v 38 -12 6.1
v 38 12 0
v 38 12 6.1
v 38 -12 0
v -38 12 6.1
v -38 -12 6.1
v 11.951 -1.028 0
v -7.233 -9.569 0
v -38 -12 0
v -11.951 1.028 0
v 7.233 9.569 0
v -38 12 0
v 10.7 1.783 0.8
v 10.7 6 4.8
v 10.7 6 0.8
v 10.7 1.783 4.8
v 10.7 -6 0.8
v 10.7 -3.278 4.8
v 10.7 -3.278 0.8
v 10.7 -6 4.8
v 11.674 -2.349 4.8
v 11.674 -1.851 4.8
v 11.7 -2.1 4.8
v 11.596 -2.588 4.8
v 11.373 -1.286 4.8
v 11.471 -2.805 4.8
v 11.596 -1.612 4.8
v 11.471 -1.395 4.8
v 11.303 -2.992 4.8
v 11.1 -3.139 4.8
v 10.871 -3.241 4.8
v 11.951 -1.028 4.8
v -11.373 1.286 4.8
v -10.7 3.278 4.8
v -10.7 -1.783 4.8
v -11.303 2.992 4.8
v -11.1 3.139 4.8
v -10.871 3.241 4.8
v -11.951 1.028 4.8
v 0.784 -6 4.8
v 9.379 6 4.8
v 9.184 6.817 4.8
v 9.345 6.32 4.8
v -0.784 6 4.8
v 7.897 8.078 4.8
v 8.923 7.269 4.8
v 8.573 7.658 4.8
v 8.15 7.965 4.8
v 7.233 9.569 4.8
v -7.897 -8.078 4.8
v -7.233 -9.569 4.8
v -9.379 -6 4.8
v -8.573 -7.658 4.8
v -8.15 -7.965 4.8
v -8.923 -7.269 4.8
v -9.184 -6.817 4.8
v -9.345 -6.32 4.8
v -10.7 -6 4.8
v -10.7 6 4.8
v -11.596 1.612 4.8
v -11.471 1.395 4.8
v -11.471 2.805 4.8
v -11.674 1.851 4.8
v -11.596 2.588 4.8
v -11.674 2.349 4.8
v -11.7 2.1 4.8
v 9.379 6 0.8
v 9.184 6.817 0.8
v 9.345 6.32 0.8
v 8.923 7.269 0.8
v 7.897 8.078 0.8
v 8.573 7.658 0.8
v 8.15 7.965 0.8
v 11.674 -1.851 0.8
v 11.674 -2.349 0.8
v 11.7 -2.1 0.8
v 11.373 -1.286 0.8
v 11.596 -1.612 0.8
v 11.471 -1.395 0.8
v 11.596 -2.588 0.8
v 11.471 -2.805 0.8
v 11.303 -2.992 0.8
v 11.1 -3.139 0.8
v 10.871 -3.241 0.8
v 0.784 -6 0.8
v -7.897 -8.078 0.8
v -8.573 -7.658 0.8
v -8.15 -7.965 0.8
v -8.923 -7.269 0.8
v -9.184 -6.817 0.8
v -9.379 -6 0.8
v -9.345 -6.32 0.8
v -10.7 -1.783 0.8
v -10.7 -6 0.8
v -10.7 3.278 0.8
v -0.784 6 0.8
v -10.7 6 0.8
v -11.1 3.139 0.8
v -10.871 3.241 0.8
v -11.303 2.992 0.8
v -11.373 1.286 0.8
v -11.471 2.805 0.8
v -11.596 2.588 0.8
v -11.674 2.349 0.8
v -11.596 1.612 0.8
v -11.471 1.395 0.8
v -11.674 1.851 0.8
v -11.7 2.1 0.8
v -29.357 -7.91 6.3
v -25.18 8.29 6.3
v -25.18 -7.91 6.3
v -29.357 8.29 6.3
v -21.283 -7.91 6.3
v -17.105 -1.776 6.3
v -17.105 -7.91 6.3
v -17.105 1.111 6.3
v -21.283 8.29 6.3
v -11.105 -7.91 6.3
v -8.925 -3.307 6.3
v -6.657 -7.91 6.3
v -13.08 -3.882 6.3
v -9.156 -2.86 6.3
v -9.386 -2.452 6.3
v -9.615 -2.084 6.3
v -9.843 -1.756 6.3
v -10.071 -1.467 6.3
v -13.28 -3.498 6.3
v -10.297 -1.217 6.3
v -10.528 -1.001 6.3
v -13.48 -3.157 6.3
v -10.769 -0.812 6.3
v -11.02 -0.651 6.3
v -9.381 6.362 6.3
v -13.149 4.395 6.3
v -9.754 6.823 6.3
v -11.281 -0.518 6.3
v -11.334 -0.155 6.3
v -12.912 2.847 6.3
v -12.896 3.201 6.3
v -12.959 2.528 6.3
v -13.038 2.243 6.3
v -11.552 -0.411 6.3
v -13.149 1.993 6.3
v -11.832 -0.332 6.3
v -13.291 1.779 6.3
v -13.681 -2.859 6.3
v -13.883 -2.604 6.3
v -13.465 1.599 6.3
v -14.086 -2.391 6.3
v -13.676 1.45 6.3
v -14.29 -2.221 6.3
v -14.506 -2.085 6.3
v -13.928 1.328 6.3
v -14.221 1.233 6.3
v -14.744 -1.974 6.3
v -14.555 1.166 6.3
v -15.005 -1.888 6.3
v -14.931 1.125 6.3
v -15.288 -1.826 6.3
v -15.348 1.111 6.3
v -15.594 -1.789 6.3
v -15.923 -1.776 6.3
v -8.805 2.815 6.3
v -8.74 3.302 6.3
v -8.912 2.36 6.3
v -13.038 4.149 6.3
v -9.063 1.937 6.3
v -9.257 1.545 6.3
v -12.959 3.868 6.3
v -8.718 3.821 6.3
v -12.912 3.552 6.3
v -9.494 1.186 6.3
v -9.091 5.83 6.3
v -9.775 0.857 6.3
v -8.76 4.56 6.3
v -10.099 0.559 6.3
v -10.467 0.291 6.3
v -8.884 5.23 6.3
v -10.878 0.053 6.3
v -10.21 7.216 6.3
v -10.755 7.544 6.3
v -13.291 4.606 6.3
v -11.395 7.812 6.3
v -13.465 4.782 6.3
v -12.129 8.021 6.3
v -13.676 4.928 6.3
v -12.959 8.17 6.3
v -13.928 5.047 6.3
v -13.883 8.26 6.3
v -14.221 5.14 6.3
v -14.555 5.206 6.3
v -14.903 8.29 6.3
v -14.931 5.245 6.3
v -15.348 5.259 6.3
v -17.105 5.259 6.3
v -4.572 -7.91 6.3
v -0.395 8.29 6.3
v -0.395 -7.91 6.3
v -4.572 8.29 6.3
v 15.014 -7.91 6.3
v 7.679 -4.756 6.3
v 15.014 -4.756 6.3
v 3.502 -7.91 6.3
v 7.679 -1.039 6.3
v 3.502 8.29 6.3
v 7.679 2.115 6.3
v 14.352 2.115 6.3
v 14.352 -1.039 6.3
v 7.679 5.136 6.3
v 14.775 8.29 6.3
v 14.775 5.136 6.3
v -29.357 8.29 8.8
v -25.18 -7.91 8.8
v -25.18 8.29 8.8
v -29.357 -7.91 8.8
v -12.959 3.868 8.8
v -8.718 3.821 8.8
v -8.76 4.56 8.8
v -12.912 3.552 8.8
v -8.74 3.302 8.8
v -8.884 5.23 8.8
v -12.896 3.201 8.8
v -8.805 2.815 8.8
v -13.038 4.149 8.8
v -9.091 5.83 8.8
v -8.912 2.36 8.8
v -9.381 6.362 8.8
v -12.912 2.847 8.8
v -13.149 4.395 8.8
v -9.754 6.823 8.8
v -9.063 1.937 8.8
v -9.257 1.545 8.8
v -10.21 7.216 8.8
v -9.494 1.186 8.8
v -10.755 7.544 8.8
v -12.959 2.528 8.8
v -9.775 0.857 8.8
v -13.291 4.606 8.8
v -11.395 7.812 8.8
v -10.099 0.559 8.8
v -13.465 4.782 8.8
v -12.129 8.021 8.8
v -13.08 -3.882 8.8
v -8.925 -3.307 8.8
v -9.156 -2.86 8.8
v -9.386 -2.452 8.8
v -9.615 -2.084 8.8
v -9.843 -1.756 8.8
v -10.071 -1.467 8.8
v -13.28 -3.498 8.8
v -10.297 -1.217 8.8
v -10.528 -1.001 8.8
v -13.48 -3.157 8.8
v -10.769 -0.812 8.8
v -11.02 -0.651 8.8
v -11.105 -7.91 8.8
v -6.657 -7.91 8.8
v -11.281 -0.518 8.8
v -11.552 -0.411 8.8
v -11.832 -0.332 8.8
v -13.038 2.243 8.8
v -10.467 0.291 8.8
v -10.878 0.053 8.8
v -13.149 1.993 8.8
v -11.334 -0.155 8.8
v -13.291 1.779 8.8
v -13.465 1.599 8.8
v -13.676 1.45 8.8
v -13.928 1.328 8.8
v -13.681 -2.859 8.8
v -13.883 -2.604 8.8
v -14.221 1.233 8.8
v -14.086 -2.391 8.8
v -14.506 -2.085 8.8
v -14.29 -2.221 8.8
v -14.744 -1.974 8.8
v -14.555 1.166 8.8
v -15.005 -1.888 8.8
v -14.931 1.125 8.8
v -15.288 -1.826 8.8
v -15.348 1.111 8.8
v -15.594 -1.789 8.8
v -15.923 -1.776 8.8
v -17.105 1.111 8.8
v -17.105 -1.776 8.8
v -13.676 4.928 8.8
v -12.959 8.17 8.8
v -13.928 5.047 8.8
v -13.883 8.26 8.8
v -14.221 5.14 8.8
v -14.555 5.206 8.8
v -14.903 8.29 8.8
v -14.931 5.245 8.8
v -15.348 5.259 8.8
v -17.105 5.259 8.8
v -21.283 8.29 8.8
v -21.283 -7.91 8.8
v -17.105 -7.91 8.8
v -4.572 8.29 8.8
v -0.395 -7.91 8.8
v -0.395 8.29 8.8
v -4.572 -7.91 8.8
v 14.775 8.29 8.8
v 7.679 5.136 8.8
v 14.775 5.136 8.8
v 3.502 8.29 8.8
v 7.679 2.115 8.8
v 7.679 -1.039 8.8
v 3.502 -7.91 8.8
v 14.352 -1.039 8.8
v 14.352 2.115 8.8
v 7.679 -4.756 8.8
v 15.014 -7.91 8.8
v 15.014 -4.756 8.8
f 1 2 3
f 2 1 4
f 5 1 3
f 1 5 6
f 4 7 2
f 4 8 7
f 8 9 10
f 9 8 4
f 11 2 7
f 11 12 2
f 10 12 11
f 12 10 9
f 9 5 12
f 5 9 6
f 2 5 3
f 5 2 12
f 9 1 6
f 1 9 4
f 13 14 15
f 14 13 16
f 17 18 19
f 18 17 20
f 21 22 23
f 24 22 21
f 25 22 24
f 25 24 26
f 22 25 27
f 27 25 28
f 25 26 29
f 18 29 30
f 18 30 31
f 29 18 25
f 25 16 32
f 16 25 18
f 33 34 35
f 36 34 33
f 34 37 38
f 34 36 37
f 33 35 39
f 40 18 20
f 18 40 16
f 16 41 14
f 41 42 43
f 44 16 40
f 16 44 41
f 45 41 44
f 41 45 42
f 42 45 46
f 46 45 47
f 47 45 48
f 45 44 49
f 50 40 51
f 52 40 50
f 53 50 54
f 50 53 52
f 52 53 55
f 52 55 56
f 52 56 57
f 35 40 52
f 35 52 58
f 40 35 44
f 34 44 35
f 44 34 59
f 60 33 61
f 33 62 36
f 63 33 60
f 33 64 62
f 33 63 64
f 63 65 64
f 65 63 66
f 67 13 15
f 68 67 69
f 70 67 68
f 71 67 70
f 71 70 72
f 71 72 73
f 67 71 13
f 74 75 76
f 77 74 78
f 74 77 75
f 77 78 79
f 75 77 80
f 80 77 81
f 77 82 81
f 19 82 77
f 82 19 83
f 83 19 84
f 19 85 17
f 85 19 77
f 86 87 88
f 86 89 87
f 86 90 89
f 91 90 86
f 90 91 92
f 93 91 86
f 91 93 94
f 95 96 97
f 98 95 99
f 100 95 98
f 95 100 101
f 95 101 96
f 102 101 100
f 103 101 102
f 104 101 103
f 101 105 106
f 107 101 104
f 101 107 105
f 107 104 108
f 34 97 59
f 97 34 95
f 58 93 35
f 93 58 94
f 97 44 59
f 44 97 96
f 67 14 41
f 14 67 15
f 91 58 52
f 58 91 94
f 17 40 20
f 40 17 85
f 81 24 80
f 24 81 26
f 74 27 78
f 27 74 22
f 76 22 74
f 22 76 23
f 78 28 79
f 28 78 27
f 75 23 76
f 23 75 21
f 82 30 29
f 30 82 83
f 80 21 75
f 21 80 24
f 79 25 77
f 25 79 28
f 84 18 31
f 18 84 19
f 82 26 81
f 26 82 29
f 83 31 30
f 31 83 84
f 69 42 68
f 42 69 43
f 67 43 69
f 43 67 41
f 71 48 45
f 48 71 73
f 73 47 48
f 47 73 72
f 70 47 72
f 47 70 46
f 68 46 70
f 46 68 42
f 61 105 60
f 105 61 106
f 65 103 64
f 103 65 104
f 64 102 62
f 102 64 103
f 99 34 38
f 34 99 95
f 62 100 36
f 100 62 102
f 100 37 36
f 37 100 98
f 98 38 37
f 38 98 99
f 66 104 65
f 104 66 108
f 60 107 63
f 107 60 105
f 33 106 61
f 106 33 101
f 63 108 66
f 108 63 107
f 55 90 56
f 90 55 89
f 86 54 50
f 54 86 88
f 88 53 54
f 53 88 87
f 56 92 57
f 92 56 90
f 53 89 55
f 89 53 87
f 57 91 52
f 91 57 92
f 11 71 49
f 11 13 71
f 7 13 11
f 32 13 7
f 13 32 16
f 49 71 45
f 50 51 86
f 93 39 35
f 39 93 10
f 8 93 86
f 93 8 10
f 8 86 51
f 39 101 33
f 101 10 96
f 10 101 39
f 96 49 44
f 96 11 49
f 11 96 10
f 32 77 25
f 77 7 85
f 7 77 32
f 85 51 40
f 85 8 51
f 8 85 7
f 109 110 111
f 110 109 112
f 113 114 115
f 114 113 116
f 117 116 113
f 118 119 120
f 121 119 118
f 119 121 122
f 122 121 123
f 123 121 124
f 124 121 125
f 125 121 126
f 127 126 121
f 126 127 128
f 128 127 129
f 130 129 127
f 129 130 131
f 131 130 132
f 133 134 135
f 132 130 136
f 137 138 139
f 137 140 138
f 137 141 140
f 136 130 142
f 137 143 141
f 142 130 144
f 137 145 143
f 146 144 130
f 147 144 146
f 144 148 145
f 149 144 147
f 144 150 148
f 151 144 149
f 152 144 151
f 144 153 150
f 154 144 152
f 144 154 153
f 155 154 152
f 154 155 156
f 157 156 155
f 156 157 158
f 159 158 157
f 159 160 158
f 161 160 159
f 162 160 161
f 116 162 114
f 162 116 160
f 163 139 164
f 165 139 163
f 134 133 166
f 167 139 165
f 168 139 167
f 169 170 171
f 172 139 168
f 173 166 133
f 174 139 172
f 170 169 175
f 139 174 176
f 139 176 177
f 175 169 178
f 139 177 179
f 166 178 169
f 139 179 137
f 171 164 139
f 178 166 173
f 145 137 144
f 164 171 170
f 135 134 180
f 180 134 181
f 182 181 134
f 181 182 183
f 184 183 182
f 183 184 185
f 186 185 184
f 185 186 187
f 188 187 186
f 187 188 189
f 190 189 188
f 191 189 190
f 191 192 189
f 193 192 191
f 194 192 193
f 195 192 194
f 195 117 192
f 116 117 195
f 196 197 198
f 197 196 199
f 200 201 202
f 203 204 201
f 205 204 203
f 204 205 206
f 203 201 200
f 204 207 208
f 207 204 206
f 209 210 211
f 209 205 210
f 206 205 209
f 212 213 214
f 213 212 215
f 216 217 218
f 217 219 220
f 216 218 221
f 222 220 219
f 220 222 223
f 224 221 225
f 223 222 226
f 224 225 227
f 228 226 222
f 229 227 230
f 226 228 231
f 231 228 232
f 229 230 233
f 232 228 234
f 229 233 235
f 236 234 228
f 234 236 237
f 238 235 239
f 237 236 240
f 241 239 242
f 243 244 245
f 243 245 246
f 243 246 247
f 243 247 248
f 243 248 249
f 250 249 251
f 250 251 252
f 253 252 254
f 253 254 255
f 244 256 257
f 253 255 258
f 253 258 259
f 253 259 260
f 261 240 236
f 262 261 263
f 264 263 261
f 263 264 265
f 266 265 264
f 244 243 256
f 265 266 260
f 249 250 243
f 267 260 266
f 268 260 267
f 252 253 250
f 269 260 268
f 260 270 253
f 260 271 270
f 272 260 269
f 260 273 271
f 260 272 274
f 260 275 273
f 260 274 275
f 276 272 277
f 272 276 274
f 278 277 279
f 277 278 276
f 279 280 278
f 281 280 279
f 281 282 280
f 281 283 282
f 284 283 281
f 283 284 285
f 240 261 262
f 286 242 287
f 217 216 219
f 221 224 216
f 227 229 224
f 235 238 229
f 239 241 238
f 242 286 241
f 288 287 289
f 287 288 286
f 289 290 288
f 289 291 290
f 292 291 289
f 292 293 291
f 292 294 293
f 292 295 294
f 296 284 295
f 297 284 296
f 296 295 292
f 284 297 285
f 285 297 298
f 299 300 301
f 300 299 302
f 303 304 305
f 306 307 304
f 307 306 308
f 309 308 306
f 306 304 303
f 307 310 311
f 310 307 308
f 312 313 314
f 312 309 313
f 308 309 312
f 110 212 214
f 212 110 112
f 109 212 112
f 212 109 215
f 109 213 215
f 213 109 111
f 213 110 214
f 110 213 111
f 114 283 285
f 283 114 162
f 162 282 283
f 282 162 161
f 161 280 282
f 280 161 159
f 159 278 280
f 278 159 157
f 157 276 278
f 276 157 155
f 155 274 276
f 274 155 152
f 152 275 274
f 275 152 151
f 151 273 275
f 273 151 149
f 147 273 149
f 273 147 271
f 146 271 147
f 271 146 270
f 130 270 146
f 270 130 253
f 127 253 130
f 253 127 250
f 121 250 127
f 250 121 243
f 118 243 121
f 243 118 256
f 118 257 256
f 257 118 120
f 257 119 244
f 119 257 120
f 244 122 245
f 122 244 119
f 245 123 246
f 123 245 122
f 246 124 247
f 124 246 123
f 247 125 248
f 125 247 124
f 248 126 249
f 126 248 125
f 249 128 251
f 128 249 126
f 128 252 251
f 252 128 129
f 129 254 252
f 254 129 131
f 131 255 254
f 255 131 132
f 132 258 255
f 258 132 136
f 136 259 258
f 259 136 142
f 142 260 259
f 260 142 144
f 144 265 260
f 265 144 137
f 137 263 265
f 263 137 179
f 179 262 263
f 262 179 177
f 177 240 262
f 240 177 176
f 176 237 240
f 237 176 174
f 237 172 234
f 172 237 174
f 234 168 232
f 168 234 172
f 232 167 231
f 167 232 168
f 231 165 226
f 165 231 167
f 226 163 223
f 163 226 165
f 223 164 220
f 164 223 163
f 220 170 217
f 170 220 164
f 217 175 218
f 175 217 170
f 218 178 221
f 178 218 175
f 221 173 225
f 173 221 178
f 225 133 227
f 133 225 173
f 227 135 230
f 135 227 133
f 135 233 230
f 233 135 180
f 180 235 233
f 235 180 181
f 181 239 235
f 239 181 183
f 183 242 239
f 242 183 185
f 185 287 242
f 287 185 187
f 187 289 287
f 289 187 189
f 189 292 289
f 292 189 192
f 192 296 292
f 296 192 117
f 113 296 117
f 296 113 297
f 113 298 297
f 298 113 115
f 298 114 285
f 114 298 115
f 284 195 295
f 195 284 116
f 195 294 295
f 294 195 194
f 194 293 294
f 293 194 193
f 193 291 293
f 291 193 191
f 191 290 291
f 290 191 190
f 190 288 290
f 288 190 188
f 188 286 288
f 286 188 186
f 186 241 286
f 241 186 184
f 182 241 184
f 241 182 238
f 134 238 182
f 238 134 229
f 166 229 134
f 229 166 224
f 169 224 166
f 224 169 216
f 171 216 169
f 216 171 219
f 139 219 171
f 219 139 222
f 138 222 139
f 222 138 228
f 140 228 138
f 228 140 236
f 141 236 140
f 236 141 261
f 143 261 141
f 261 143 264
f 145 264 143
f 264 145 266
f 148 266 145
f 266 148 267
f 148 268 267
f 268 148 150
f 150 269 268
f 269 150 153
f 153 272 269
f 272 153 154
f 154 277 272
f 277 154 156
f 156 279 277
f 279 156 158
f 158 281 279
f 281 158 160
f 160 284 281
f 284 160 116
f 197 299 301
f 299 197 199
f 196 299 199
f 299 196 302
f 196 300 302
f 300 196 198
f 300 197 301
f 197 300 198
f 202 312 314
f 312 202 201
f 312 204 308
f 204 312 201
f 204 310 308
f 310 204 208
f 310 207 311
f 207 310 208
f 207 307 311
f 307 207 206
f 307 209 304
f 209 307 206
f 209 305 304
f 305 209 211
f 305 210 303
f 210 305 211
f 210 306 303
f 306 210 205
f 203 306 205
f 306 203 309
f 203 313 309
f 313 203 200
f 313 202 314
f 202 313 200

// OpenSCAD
//block_text = "ELLA";
block_text = "IRIE  ";
left_wiggle = 0; //Adjust to center the letters properly
layer_height = 0.1; // The letters "float" above the block so that it does a decent fill
font_kern = 0.75; //ratio of width to height
font = "Ubuntu Bold:style=bold";
letter_size = 16;
block_height = 6.1;
text_height = 2.5;
mag_inset = 0.8;
mag_l = 21;
mag_w = 11.6;
mag_h = 4;
border = 2;
difference() {
    translate([0,0,block_height/2]) cube([len(block_text)*letter_size*font_kern+2*border,letter_size+4*border,block_height],true);
    // The pocket is based on a 10x20x3.75mm magnet
    translate([0,0,mag_inset+mag_h/2]) cube([mag_l+0.4,mag_w+0.4,mag_h],true);
    translate([mag_l/2,-2.1,mag_inset]) cylinder(mag_h,r=1.2,$fn=30);
    translate([6.9,5.8,mag_inset]) cylinder(mag_h,r=2.5,$fn=30);
    translate([-mag_l/2,2.1,mag_inset]) cylinder(mag_h,r=1.2,$fn=30);
    translate([-6.9,-5.8,mag_inset]) cylinder(mag_h,r=2.5,$fn=30);
    translate([0,0,(mag_h+mag_inset)/2]) rotate([0,0,24]) cube([mag_l,mag_w,mag_h+mag_inset],true);
}
translate([left_wiggle,0,block_height+2*layer_height]) linear_extrude(height=text_height) text(block_text, size = letter_size, font = font, halign = "center", valign = "center", $fn = 40);
//translate([18,-9.5,10]) scale([0.2,0.2,0.09]) surface(file="../Downloads/weed4.png",invert=true);
//rotate([0,0,8]) cube([20,9.7,3.8],true);
